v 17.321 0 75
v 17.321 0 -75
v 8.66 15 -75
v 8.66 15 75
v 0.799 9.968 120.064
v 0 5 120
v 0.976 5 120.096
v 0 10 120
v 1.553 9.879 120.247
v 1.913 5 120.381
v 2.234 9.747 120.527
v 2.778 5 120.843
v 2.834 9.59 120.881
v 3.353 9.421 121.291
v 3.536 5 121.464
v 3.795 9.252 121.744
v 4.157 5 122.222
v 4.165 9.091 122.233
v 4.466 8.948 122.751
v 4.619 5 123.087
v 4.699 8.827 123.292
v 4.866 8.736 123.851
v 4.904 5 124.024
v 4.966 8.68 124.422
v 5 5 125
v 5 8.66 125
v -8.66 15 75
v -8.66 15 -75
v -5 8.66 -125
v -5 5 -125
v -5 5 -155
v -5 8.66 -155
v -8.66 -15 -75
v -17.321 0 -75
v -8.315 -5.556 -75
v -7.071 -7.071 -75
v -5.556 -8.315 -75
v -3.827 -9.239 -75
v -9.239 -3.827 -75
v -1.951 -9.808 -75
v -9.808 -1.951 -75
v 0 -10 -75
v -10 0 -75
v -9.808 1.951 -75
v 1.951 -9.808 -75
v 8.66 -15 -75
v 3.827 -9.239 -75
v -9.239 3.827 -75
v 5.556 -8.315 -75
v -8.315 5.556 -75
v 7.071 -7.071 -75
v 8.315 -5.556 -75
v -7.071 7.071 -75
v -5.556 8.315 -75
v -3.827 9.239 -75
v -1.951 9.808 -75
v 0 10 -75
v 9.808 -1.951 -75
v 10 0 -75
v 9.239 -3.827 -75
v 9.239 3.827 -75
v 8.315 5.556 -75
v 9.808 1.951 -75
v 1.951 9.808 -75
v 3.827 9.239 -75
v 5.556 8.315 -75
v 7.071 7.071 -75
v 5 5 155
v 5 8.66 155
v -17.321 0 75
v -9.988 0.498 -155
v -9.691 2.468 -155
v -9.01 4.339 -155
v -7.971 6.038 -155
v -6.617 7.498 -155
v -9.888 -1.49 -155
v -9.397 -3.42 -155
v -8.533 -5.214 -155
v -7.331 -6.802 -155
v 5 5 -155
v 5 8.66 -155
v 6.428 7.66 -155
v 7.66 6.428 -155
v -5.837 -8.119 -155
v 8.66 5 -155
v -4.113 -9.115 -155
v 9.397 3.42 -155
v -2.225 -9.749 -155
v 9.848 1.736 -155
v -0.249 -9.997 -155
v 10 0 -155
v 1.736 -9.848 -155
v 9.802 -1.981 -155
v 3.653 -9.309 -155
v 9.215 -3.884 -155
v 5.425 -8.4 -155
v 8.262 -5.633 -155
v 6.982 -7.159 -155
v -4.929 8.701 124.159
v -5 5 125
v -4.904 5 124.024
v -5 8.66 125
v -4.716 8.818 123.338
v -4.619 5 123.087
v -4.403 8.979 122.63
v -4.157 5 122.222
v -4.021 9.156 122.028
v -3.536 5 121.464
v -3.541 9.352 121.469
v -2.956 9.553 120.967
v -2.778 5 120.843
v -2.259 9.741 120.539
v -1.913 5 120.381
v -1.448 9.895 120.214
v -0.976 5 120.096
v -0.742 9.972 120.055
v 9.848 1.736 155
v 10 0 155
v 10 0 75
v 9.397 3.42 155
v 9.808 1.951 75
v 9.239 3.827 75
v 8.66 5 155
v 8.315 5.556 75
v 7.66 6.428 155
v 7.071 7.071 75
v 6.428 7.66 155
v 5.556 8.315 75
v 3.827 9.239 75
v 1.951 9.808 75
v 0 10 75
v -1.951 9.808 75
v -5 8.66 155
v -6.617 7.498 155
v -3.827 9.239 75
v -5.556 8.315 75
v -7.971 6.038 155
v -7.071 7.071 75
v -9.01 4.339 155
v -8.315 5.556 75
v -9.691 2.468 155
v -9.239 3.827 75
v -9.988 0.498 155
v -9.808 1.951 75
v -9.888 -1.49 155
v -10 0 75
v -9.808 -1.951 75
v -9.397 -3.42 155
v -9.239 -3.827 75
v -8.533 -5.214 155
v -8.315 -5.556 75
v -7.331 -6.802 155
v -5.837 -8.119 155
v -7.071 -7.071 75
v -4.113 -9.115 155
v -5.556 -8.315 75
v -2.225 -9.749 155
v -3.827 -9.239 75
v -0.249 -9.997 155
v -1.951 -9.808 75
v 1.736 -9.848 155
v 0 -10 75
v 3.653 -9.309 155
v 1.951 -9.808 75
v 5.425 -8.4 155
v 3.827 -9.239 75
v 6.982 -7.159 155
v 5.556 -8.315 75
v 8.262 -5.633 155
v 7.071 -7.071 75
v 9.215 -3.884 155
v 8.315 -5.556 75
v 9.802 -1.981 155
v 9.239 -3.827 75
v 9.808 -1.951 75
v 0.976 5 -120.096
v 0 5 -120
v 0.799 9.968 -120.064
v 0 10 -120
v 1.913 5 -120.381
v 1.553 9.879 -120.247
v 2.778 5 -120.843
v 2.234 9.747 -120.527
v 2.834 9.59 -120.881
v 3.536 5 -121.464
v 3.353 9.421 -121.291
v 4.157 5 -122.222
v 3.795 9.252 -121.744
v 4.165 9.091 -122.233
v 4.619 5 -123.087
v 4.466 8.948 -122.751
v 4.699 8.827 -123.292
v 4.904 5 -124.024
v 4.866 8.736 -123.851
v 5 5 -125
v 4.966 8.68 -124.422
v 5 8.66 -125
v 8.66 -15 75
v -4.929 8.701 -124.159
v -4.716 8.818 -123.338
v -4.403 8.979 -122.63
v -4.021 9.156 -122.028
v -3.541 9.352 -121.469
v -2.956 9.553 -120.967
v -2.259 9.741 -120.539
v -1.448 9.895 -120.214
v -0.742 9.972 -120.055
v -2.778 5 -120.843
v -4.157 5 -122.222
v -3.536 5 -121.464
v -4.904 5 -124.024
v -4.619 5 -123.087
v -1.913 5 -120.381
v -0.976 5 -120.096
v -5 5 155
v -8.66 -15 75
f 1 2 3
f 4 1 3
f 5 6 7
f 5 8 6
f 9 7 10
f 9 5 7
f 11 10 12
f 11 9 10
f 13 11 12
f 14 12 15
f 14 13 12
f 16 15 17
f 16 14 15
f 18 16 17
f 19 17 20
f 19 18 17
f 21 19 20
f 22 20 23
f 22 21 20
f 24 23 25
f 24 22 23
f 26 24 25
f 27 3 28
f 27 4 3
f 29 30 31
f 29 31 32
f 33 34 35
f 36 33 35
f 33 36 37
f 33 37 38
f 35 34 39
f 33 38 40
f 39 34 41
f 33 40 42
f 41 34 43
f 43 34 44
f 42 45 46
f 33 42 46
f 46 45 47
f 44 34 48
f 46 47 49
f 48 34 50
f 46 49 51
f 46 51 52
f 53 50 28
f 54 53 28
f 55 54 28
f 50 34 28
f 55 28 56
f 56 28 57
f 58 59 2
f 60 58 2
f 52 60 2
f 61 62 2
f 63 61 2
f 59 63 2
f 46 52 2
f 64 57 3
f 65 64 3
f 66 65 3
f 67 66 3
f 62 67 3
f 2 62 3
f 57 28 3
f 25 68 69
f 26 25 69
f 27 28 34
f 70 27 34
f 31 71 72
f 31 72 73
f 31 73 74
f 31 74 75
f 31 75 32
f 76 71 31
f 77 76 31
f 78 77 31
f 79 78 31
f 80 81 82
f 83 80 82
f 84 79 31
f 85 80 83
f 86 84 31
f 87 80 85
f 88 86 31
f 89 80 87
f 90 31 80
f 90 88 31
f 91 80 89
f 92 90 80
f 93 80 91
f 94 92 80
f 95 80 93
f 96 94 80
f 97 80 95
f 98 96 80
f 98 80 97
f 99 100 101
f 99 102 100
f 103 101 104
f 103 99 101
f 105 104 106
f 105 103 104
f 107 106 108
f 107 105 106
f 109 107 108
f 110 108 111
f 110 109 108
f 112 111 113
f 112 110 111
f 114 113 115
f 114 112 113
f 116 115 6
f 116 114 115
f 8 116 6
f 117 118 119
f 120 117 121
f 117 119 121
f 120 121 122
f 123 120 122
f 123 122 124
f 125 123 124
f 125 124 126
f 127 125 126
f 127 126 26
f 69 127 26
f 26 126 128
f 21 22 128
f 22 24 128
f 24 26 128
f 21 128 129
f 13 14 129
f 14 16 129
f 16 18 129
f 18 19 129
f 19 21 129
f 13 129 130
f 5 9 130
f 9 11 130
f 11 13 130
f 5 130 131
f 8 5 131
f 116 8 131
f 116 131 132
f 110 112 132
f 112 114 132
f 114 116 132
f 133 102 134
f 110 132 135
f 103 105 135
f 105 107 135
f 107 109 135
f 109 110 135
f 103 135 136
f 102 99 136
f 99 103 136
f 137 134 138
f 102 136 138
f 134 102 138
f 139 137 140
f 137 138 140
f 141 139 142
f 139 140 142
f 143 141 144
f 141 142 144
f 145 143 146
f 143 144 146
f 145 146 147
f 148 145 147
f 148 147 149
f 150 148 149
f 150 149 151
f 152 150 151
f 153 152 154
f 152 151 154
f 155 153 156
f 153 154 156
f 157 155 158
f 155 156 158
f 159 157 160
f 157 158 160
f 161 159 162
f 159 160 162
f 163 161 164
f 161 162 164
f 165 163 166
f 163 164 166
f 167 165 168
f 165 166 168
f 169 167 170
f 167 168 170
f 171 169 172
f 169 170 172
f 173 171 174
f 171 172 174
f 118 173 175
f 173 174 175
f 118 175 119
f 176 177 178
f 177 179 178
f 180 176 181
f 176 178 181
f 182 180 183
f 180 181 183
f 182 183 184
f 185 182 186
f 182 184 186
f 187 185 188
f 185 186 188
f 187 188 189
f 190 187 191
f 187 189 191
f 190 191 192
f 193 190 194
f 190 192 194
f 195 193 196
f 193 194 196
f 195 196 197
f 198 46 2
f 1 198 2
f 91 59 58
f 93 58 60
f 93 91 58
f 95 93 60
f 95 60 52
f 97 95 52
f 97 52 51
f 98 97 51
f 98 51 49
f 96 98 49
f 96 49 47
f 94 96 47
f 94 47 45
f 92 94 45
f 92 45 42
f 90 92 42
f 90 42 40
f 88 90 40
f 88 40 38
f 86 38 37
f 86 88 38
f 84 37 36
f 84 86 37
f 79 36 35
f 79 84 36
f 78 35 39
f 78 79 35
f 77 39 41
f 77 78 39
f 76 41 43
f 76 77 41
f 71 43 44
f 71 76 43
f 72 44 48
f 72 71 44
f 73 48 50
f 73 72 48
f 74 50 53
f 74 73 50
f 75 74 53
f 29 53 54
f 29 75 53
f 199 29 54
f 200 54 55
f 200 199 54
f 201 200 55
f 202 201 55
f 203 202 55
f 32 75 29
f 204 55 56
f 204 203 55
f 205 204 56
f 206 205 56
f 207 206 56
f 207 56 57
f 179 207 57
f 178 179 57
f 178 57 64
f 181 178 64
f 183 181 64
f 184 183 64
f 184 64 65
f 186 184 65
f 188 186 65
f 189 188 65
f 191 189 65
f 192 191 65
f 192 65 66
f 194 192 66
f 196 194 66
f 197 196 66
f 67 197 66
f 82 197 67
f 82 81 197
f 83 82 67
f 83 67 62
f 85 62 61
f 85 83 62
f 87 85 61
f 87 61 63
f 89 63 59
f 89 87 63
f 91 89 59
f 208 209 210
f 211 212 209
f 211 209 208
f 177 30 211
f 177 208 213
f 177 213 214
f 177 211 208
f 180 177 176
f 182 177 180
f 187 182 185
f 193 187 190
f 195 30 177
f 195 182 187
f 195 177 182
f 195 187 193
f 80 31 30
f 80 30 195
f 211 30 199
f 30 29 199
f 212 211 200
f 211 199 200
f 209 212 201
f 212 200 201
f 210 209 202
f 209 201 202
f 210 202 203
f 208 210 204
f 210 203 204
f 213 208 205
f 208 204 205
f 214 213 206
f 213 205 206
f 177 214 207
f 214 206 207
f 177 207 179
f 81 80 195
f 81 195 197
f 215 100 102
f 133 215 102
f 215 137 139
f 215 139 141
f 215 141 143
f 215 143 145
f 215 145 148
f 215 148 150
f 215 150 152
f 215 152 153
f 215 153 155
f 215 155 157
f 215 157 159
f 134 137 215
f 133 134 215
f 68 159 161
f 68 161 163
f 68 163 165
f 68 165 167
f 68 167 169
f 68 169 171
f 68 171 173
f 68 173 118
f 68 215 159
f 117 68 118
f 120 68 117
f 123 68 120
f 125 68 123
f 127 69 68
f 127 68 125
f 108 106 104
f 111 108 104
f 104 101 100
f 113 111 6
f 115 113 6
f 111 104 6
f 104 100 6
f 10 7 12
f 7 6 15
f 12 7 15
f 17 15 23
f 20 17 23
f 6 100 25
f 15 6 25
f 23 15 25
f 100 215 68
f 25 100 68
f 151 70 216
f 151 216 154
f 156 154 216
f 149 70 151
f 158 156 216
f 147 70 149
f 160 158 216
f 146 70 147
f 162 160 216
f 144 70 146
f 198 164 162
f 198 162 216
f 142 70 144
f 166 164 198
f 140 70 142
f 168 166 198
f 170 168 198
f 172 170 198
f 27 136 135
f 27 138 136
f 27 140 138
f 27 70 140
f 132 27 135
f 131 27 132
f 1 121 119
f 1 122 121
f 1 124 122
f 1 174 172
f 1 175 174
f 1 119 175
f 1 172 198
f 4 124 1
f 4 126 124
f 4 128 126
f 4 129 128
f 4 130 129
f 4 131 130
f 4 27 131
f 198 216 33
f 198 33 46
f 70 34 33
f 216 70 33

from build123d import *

# Parameters (mm, degrees)
BOSS_EXTRUDE1_DEPTH  = 75
SKETCH2_R            = 10
BOSS_EXTRUDE2_DEPTH  = 80
BOSS_EXTRUDE3_START  = 80
SKETCH3_R            = 10
BOSS_EXTRUDE3_DEPTH  = 80
SKETCH4_W            = 10
SKETCH4_H            = 18.646809019
CUT_EXTRUDE1_DEPTH   = 35
FILLET1_R            = 5
FILLET1_OF_MIRROR1_R = 5


with BuildPart() as part:
    # Sketch1 → Boss-Extrude1 (new, symmetric)
    with BuildSketch(Plane.XY):
        Polygon((8.660254038, 15), (-8.660254038, 15), (-17.320508076, 0), (-8.660254038, -15), (8.660254038, -15), (17.320508076, 0), align=None)
    extrude(amount=BOSS_EXTRUDE1_DEPTH, both=True)

    # Sketch2 → Boss-Extrude2 (add)
    with BuildSketch(Plane.XY.offset(75)):
        Circle(SKETCH2_R)
    extrude(amount=BOSS_EXTRUDE2_DEPTH)

    # Sketch3 → Boss-Extrude3 (add)
    with BuildSketch(Plane(origin=(0, 0, -75), x_dir=(-1, 0, 0), z_dir=(0, 0, -1)).offset(BOSS_EXTRUDE3_START)):
        with Locations(Location((0, 0, 0), (0, 0, 180))):
            Circle(SKETCH3_R)
    extrude(amount=-BOSS_EXTRUDE3_DEPTH)

    # Sketch4 → Cut-Extrude1 (cut)
    with BuildSketch(Plane.XY.offset(155)):
        with Locations((0, 14.32340451)):
            Rectangle(SKETCH4_W, SKETCH4_H)
    cut_extrude1 = extrude(amount=-CUT_EXTRUDE1_DEPTH, mode=Mode.SUBTRACT)

    # Fillet1
    fillet1_edges = [part.edges().sort_by_distance(p)[0] for p in [
        (5, 6.830127019, 120),
        (-5, 6.830127019, 120),
    ]]
    fillet(fillet1_edges, radius=FILLET1_R - 0.0001)  # a hair under: the kernel refuses the full size

    # Mirror1: Cut-Extrude1 across plane
    add(cut_extrude1.mirror(Plane.XY), mode=Mode.SUBTRACT)

    # Fillet1 of Mirror1
    fillet1_of_mirror1_edges = [part.edges().sort_by_distance(p)[0] for p in [
        (5, 6.830127019, -120),
        (-5, 6.830127019, -120),
    ]]
    fillet(fillet1_of_mirror1_edges, radius=FILLET1_OF_MIRROR1_R - 0.0001)  # a hair under: the kernel refuses the full size


solid = part.part
